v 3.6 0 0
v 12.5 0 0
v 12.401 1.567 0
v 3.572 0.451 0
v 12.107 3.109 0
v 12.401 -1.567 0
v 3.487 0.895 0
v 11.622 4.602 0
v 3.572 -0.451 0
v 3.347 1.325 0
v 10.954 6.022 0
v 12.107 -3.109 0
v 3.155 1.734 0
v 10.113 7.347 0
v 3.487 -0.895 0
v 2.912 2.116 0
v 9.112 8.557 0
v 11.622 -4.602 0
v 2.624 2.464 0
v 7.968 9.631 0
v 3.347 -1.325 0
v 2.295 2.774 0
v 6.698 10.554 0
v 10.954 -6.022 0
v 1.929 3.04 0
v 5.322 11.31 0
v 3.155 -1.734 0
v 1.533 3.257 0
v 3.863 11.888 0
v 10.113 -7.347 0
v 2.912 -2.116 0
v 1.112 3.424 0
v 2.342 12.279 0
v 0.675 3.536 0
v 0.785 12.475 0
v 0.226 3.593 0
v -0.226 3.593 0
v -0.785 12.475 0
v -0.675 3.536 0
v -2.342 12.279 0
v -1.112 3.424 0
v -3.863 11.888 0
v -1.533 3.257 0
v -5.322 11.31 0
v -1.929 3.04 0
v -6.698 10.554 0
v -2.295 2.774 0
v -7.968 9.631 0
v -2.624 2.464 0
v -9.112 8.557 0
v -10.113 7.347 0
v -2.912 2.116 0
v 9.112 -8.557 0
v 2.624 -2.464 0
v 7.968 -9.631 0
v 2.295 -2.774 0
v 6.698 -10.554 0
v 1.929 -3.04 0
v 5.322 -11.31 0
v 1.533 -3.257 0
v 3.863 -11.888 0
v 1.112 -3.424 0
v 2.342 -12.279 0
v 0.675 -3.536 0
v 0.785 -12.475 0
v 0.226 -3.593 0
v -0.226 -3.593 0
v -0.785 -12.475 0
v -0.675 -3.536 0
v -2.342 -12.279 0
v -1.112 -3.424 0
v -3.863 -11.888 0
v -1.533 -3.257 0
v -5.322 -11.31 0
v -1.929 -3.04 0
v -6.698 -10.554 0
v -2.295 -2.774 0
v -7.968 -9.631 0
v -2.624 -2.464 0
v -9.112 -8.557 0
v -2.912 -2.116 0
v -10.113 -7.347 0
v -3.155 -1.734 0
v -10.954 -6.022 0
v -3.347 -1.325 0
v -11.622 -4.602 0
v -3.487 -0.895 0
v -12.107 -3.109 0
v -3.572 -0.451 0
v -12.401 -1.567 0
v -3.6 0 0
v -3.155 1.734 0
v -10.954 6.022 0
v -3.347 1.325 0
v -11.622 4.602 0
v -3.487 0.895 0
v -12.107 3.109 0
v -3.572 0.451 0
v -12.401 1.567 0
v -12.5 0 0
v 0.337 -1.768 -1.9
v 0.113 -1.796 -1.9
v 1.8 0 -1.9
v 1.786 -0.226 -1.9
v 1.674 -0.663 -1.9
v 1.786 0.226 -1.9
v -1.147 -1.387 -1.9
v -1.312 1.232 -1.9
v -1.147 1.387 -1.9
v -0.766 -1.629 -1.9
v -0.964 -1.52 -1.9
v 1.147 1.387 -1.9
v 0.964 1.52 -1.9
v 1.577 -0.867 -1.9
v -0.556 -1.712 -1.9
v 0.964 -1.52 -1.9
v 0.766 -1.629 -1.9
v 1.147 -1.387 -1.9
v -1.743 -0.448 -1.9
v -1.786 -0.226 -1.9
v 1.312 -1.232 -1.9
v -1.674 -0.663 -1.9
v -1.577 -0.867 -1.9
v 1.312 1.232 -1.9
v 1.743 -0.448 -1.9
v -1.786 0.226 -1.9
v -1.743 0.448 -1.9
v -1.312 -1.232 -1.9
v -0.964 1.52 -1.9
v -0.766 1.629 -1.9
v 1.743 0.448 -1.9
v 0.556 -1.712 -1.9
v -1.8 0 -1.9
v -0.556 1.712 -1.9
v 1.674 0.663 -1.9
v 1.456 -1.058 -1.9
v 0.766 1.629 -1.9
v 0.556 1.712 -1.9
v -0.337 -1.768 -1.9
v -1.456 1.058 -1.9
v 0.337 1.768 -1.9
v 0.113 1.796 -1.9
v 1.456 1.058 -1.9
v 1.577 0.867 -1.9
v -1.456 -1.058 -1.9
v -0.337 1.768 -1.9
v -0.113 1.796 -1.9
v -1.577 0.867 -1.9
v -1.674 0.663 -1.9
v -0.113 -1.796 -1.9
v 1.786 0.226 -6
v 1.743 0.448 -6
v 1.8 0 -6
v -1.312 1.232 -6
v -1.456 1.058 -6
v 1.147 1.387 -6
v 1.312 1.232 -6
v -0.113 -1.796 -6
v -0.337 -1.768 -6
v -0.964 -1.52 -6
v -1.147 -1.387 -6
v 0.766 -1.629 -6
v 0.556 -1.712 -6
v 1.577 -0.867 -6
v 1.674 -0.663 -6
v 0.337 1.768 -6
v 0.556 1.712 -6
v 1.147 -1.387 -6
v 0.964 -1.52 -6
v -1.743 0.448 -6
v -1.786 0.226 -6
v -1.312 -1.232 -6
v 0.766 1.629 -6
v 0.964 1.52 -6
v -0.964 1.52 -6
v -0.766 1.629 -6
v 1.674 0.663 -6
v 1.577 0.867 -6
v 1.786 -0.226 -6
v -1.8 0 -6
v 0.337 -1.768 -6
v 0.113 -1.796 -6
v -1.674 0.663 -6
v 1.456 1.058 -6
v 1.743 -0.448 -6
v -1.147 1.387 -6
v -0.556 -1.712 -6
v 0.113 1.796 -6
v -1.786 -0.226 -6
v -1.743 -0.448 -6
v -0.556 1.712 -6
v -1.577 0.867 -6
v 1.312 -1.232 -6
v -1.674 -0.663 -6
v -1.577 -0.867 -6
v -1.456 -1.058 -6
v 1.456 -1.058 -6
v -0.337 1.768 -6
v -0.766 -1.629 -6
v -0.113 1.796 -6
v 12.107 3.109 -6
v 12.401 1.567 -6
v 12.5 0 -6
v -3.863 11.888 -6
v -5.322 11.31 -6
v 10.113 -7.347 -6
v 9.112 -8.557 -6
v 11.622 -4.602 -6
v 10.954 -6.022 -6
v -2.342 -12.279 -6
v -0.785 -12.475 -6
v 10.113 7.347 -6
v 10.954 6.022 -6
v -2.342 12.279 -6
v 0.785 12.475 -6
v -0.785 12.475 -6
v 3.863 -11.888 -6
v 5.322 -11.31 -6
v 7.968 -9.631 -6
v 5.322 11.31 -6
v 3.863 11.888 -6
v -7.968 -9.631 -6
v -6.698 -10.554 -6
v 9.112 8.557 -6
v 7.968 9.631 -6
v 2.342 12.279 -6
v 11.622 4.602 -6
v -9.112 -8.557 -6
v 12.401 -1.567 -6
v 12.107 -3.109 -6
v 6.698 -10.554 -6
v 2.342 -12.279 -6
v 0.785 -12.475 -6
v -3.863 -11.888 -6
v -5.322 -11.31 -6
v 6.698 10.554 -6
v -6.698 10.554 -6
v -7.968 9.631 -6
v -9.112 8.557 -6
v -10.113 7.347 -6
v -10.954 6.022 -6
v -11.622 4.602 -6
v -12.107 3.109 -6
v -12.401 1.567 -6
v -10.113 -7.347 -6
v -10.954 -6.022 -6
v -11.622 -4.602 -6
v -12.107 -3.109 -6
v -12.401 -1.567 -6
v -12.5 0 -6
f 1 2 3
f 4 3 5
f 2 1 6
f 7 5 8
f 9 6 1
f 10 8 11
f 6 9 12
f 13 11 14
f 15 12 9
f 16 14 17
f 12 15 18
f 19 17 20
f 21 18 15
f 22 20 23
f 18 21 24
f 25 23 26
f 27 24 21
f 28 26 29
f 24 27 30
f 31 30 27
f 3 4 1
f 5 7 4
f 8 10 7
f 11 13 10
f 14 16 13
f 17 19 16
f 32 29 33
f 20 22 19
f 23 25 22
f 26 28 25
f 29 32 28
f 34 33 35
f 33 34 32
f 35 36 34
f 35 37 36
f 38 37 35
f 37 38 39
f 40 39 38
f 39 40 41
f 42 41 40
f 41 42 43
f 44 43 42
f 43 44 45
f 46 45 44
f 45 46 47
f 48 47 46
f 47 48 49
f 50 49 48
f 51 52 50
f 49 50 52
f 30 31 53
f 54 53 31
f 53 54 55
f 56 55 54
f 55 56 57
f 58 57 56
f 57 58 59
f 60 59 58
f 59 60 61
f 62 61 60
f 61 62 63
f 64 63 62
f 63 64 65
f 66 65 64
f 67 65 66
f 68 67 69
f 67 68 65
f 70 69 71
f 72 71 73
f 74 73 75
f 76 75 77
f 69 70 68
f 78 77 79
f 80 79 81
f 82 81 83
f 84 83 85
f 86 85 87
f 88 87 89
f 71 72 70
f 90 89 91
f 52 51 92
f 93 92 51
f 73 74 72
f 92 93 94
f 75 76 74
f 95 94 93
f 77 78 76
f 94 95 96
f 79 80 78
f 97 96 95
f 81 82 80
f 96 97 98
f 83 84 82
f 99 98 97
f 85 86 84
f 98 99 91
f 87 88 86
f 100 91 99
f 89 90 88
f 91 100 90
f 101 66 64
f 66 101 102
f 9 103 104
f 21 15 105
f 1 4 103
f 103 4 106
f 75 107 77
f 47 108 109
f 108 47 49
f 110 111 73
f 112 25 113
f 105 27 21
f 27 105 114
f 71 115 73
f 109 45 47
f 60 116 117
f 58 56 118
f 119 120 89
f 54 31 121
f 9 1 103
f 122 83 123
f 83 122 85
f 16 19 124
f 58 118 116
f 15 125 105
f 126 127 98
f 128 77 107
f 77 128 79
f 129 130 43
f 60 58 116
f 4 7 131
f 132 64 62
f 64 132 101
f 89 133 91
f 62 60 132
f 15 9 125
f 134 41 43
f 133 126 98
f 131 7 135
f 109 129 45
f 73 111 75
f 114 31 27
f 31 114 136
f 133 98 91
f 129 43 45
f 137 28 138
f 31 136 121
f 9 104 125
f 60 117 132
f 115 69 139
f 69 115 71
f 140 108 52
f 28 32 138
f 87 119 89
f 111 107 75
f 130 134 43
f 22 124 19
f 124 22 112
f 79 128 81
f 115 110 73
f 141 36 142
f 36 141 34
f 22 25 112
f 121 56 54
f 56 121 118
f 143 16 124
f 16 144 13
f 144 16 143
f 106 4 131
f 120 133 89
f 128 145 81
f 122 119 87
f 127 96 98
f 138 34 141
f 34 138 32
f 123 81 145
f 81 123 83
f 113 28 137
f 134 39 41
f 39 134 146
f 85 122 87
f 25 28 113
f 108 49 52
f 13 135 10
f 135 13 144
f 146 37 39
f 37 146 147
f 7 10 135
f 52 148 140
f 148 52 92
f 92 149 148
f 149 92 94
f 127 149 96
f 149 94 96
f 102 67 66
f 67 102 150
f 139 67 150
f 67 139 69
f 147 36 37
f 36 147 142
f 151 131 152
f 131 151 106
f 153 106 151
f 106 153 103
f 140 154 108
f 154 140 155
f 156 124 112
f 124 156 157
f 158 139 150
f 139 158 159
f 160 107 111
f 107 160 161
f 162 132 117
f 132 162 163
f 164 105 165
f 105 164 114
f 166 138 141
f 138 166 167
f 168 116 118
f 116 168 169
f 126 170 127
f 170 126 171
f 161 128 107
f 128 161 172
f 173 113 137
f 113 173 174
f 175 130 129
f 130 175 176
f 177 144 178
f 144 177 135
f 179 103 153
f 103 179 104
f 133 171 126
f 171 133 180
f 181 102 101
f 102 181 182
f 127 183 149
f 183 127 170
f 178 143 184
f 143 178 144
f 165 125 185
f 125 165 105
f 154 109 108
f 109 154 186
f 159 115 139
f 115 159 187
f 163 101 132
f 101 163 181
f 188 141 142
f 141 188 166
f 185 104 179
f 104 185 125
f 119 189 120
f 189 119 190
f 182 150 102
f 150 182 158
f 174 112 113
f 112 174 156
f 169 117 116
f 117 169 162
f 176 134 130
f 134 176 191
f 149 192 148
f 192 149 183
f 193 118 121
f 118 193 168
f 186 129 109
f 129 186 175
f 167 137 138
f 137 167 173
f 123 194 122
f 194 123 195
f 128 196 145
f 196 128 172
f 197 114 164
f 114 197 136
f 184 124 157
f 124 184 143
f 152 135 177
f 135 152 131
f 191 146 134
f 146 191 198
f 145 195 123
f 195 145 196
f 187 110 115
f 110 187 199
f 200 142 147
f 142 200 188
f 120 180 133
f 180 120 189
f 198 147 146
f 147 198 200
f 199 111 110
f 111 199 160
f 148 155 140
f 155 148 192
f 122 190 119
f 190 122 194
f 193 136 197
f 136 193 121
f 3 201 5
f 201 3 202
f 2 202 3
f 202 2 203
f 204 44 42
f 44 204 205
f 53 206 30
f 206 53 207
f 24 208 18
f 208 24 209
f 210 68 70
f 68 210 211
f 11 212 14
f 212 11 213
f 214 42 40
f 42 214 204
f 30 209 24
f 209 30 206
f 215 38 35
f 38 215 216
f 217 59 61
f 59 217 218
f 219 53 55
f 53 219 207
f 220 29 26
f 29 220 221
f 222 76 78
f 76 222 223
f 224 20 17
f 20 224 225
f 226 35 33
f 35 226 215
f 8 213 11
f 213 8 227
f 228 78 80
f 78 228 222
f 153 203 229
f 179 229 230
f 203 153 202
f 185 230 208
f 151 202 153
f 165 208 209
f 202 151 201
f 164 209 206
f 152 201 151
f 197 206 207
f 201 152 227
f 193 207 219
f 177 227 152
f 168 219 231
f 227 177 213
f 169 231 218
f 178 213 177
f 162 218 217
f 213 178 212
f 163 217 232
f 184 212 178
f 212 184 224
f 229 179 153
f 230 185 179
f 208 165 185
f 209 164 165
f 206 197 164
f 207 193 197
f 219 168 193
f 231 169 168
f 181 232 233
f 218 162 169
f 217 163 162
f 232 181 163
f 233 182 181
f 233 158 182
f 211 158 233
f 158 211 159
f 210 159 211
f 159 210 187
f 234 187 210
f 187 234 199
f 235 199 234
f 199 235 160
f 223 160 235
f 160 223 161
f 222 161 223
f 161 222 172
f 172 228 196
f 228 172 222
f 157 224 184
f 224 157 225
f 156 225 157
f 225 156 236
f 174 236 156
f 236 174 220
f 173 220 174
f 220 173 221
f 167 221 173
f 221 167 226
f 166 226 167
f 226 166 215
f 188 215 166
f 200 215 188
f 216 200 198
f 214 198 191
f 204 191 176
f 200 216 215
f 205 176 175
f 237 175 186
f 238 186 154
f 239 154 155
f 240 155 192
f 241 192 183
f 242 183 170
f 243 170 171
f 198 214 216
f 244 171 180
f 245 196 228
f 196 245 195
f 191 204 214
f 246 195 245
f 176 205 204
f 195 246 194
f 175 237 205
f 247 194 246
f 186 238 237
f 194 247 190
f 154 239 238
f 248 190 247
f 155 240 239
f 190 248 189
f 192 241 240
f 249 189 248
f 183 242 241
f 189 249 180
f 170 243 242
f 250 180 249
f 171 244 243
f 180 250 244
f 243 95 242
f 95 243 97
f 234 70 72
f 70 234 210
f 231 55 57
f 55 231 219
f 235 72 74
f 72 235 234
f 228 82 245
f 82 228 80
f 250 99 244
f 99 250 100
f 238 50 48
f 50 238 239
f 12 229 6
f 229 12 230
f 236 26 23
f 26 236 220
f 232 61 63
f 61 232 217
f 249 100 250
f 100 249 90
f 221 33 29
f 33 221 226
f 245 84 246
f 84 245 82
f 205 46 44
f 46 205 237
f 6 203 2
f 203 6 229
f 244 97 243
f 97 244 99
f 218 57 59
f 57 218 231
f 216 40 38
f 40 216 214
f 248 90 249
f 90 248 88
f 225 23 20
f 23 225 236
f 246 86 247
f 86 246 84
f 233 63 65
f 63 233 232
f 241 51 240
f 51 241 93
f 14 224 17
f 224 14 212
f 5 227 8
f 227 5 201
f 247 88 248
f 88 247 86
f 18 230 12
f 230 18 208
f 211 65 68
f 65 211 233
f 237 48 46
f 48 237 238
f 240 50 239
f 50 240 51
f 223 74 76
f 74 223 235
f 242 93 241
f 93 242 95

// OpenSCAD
$fn = 50;

difference() {
	union() {
		translate(v = [0, 0, -6.0]) {
			cylinder(h = 6, r = 12.5);
		}
	}
	union() {
		translate(v = [0, 0, 0]) {
			rotate(a = [0, 0, 0]) {
				difference() {
					union() {
						translate(v = [0, 0, -9.0]) {
							cylinder(h = 9, r = 1.5);
						}
						translate(v = [0, 0, -1.9]) {
							cylinder(h = 1.9, r1 = 1.8, r2 = 3.6);
						}
						translate(v = [0, 0, -9.0]) {
							cylinder(h = 9, r = 1.8);
						}
						translate(v = [0, 0, -9.0]) {
							cylinder(h = 9, r = 1.5);
						}
					}
					union();
				}
			}
		}
	}
}
